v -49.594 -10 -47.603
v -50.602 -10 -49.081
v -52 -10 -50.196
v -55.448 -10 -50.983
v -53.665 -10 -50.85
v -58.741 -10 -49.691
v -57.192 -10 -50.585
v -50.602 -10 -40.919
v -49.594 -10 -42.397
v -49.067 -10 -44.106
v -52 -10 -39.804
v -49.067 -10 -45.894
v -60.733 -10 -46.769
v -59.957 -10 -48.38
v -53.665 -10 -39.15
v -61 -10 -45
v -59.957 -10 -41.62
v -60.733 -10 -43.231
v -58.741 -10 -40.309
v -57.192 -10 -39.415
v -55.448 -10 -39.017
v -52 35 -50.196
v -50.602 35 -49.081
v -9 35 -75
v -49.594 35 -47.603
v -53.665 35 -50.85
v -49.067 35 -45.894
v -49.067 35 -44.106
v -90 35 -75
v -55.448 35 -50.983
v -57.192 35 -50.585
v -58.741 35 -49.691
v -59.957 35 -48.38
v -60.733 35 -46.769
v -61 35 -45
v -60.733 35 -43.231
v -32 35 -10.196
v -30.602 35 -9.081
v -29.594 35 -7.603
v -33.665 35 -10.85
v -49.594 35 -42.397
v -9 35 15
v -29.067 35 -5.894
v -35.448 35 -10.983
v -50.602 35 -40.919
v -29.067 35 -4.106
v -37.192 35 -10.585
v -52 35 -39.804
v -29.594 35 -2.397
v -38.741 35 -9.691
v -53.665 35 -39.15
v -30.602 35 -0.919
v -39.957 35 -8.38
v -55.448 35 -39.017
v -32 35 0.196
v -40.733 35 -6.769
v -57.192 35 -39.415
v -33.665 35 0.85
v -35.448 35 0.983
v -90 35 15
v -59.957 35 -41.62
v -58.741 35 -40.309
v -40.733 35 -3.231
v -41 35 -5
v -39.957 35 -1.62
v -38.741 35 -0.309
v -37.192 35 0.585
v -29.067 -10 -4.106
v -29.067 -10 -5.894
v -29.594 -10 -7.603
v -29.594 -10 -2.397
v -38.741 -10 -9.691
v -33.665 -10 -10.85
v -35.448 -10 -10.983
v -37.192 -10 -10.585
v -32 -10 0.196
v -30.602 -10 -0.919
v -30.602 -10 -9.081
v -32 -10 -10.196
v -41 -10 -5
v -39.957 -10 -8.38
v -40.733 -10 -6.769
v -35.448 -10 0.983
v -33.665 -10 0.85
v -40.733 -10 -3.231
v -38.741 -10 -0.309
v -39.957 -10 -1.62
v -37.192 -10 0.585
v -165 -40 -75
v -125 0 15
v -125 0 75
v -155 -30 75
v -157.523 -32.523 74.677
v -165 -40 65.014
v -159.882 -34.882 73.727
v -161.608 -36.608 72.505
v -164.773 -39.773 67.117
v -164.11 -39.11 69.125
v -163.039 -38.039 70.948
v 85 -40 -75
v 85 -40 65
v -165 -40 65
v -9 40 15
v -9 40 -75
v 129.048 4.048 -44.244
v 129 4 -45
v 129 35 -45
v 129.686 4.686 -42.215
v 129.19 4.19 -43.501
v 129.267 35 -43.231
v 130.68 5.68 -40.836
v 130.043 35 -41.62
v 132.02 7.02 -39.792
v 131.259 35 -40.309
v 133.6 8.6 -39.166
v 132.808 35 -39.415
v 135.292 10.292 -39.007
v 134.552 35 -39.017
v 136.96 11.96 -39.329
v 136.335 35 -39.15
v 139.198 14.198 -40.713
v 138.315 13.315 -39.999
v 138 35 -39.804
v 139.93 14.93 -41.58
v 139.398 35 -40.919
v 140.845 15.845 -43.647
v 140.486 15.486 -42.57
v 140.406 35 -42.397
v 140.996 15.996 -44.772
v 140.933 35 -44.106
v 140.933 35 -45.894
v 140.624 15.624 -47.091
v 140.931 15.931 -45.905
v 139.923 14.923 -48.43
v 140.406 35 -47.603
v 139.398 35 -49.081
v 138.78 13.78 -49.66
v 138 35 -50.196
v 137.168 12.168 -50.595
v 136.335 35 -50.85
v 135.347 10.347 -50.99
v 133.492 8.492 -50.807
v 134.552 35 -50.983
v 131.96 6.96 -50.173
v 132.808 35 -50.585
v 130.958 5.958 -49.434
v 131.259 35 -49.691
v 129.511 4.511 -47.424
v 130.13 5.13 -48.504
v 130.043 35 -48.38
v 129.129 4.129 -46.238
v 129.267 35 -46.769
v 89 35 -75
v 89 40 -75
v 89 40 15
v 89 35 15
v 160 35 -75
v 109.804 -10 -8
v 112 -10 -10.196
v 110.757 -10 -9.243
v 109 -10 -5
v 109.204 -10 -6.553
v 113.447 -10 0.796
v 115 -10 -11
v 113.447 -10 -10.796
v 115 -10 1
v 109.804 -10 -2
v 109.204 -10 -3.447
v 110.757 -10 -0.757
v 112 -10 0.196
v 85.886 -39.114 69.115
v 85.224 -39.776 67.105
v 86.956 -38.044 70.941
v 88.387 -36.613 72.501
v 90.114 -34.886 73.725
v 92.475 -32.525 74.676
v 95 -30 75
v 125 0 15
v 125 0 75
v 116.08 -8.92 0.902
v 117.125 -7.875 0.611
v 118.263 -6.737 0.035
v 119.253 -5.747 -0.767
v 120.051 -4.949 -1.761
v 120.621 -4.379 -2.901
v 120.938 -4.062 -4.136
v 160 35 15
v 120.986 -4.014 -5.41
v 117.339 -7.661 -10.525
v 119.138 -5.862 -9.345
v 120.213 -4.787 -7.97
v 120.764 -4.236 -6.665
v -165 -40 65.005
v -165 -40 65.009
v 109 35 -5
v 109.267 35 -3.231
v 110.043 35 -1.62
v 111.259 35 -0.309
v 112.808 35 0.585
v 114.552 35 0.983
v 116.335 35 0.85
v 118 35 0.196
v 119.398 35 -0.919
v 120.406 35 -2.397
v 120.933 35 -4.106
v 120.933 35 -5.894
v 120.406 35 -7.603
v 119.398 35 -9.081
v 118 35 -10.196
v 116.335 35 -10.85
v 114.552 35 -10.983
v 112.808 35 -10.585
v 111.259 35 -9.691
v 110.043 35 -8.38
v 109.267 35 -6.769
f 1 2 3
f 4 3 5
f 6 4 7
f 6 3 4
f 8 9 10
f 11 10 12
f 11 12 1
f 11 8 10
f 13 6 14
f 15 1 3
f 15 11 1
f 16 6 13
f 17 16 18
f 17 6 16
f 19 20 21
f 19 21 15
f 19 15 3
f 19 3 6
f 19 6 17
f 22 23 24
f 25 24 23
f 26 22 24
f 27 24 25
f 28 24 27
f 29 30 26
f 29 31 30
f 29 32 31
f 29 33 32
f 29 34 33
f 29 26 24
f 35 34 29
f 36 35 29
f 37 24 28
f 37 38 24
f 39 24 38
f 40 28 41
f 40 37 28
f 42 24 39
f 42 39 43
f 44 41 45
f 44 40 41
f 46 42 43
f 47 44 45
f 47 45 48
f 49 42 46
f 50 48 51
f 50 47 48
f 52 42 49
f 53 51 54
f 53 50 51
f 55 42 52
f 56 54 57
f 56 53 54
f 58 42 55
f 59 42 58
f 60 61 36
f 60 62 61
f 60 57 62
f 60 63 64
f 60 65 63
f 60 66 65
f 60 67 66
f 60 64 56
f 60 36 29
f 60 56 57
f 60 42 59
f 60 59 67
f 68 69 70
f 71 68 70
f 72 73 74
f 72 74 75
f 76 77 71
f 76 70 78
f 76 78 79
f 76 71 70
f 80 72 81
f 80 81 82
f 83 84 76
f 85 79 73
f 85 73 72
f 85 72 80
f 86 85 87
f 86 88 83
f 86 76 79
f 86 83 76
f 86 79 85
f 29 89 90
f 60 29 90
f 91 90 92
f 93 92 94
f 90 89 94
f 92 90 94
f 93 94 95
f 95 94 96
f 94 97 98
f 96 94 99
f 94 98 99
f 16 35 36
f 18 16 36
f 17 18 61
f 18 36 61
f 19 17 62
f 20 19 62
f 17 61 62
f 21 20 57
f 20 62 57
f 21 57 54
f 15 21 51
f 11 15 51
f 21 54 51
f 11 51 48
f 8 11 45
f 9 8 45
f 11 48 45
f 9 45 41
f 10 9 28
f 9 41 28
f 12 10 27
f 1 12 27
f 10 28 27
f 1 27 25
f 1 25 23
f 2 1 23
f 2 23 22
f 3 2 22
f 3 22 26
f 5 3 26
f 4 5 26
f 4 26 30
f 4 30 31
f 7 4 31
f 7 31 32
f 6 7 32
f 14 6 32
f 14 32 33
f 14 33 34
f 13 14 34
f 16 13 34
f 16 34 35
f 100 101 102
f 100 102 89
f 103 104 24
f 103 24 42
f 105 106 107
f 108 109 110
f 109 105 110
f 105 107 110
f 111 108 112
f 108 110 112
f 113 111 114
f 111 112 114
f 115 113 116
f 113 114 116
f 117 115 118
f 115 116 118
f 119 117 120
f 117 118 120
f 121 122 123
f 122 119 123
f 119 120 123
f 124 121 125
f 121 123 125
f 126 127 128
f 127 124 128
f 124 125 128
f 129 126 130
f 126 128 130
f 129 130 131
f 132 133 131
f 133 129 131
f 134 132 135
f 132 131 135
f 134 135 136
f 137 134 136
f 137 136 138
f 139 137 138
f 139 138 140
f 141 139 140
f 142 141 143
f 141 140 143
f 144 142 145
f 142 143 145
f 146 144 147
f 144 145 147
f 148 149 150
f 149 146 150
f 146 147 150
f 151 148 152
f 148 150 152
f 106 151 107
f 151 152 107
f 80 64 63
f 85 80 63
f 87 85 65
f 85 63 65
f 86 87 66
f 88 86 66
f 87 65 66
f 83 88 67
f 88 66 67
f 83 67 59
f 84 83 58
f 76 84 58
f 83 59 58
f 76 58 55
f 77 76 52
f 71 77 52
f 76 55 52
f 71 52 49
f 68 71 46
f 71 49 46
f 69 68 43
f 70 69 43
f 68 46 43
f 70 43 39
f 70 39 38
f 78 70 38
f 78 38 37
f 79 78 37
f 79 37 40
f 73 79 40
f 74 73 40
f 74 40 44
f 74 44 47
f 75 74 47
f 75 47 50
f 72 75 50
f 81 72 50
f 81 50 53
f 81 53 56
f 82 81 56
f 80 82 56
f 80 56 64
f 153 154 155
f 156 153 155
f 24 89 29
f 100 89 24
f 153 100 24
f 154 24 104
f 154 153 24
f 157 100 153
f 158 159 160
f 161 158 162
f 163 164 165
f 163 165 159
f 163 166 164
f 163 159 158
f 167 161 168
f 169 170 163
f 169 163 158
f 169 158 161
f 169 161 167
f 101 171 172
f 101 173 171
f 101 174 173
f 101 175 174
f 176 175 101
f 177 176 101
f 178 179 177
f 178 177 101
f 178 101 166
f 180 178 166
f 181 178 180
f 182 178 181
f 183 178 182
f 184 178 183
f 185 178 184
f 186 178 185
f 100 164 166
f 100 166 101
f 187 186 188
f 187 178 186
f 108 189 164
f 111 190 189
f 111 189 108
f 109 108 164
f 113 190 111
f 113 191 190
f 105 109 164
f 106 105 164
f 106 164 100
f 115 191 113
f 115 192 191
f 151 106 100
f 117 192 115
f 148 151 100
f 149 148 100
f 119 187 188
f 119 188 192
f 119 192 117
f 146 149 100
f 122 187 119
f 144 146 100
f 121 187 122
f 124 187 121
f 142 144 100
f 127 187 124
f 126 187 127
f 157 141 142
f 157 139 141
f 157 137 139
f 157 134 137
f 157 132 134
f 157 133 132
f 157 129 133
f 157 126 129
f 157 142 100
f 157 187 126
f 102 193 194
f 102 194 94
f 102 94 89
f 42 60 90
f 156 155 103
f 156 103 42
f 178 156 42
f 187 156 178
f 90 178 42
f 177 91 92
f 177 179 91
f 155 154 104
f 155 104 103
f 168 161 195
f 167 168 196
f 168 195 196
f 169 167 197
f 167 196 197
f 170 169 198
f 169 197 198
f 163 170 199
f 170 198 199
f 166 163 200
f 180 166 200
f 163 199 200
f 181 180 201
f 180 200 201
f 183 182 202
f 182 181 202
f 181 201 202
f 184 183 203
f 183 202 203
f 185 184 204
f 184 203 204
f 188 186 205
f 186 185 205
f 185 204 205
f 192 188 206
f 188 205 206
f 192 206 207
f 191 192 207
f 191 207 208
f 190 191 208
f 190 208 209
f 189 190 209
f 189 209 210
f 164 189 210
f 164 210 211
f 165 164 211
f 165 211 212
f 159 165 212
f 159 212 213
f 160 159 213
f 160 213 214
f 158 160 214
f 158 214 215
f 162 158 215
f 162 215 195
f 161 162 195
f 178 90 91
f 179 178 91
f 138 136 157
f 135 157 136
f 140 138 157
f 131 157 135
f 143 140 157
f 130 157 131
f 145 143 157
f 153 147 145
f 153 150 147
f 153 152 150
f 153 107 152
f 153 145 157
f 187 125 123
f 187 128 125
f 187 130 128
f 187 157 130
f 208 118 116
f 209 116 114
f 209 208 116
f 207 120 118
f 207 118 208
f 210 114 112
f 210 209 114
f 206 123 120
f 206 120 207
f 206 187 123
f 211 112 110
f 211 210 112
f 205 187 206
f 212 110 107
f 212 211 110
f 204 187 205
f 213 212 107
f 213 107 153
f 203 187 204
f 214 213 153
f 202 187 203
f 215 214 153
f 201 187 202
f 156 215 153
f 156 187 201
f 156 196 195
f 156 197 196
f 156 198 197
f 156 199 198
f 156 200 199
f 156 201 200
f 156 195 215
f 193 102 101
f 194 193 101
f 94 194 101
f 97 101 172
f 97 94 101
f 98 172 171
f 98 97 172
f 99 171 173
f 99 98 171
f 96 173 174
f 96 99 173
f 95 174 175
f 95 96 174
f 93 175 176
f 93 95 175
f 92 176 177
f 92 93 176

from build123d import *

# Parameters (mm, degrees)
F3_DEPTH = 165
F4_SIZE  = 79.99999
F5_R     = 6
F6_DEPTH = 50
F7_W     = 116
F7_H     = 90
F8_DEPTH = 5
F9_R     = 10


# Not quite as in the source:
# - a fillet or chamfer is up to 0.001 mm smaller than in the source, because OpenCascade refuses the exact size


with BuildPart() as f3:
    # F2 (on Right) → F3 (new body, symmetric)
    with BuildSketch(Plane.YZ):
        Polygon((-40, 75), (-40, -75), (40, -75), (40, 15), (0, 15), (0, 75), align=None)
    extrude(amount=F3_DEPTH, both=True)

    # F4 (size 80 in the source; OpenCascade refuses exactly that, so slightly less here)
    f4_edges = [f3.edges().sort_by_distance(p)[0] for p in [
        (-165, 40, -30),
        (165, -40, 0),
    ]]
    chamfer(f4_edges, length=F4_SIZE)

    # F5 (on face) → F6 (cut)
    with BuildSketch(Plane(origin=(0, 40, 0), x_dir=(-1, 0, 0), z_dir=(0, 1, 0))):
        with Locations((35, -5)):
            Circle(F5_R)
        with Locations((55, -45)):
            Circle(F5_R)
        with Locations((-115, -5)):
            Circle(F5_R)
        with Locations((-135, -45)):
            Circle(F5_R)
    extrude(amount=-F6_DEPTH, mode=Mode.SUBTRACT)

    # F7 (on face) → F8 (cut)
    with BuildSketch(Plane(origin=(0, 40, 0), x_dir=(-1, 0, 0), z_dir=(0, 1, 0))):
        with Locations((67, -30)):
            Rectangle(F7_W, F7_H)
        with Locations((-147, -30)):
            Rectangle(F7_W, F7_H)
    extrude(amount=-F8_DEPTH, mode=Mode.SUBTRACT)

    # F9
    f9_edges = [f3.edges().sort_by_distance(p)[0] for p in [
        (-39.999995, -40, 75),
    ]]
    fillet(f9_edges, radius=F9_R)


solid = f3.part
